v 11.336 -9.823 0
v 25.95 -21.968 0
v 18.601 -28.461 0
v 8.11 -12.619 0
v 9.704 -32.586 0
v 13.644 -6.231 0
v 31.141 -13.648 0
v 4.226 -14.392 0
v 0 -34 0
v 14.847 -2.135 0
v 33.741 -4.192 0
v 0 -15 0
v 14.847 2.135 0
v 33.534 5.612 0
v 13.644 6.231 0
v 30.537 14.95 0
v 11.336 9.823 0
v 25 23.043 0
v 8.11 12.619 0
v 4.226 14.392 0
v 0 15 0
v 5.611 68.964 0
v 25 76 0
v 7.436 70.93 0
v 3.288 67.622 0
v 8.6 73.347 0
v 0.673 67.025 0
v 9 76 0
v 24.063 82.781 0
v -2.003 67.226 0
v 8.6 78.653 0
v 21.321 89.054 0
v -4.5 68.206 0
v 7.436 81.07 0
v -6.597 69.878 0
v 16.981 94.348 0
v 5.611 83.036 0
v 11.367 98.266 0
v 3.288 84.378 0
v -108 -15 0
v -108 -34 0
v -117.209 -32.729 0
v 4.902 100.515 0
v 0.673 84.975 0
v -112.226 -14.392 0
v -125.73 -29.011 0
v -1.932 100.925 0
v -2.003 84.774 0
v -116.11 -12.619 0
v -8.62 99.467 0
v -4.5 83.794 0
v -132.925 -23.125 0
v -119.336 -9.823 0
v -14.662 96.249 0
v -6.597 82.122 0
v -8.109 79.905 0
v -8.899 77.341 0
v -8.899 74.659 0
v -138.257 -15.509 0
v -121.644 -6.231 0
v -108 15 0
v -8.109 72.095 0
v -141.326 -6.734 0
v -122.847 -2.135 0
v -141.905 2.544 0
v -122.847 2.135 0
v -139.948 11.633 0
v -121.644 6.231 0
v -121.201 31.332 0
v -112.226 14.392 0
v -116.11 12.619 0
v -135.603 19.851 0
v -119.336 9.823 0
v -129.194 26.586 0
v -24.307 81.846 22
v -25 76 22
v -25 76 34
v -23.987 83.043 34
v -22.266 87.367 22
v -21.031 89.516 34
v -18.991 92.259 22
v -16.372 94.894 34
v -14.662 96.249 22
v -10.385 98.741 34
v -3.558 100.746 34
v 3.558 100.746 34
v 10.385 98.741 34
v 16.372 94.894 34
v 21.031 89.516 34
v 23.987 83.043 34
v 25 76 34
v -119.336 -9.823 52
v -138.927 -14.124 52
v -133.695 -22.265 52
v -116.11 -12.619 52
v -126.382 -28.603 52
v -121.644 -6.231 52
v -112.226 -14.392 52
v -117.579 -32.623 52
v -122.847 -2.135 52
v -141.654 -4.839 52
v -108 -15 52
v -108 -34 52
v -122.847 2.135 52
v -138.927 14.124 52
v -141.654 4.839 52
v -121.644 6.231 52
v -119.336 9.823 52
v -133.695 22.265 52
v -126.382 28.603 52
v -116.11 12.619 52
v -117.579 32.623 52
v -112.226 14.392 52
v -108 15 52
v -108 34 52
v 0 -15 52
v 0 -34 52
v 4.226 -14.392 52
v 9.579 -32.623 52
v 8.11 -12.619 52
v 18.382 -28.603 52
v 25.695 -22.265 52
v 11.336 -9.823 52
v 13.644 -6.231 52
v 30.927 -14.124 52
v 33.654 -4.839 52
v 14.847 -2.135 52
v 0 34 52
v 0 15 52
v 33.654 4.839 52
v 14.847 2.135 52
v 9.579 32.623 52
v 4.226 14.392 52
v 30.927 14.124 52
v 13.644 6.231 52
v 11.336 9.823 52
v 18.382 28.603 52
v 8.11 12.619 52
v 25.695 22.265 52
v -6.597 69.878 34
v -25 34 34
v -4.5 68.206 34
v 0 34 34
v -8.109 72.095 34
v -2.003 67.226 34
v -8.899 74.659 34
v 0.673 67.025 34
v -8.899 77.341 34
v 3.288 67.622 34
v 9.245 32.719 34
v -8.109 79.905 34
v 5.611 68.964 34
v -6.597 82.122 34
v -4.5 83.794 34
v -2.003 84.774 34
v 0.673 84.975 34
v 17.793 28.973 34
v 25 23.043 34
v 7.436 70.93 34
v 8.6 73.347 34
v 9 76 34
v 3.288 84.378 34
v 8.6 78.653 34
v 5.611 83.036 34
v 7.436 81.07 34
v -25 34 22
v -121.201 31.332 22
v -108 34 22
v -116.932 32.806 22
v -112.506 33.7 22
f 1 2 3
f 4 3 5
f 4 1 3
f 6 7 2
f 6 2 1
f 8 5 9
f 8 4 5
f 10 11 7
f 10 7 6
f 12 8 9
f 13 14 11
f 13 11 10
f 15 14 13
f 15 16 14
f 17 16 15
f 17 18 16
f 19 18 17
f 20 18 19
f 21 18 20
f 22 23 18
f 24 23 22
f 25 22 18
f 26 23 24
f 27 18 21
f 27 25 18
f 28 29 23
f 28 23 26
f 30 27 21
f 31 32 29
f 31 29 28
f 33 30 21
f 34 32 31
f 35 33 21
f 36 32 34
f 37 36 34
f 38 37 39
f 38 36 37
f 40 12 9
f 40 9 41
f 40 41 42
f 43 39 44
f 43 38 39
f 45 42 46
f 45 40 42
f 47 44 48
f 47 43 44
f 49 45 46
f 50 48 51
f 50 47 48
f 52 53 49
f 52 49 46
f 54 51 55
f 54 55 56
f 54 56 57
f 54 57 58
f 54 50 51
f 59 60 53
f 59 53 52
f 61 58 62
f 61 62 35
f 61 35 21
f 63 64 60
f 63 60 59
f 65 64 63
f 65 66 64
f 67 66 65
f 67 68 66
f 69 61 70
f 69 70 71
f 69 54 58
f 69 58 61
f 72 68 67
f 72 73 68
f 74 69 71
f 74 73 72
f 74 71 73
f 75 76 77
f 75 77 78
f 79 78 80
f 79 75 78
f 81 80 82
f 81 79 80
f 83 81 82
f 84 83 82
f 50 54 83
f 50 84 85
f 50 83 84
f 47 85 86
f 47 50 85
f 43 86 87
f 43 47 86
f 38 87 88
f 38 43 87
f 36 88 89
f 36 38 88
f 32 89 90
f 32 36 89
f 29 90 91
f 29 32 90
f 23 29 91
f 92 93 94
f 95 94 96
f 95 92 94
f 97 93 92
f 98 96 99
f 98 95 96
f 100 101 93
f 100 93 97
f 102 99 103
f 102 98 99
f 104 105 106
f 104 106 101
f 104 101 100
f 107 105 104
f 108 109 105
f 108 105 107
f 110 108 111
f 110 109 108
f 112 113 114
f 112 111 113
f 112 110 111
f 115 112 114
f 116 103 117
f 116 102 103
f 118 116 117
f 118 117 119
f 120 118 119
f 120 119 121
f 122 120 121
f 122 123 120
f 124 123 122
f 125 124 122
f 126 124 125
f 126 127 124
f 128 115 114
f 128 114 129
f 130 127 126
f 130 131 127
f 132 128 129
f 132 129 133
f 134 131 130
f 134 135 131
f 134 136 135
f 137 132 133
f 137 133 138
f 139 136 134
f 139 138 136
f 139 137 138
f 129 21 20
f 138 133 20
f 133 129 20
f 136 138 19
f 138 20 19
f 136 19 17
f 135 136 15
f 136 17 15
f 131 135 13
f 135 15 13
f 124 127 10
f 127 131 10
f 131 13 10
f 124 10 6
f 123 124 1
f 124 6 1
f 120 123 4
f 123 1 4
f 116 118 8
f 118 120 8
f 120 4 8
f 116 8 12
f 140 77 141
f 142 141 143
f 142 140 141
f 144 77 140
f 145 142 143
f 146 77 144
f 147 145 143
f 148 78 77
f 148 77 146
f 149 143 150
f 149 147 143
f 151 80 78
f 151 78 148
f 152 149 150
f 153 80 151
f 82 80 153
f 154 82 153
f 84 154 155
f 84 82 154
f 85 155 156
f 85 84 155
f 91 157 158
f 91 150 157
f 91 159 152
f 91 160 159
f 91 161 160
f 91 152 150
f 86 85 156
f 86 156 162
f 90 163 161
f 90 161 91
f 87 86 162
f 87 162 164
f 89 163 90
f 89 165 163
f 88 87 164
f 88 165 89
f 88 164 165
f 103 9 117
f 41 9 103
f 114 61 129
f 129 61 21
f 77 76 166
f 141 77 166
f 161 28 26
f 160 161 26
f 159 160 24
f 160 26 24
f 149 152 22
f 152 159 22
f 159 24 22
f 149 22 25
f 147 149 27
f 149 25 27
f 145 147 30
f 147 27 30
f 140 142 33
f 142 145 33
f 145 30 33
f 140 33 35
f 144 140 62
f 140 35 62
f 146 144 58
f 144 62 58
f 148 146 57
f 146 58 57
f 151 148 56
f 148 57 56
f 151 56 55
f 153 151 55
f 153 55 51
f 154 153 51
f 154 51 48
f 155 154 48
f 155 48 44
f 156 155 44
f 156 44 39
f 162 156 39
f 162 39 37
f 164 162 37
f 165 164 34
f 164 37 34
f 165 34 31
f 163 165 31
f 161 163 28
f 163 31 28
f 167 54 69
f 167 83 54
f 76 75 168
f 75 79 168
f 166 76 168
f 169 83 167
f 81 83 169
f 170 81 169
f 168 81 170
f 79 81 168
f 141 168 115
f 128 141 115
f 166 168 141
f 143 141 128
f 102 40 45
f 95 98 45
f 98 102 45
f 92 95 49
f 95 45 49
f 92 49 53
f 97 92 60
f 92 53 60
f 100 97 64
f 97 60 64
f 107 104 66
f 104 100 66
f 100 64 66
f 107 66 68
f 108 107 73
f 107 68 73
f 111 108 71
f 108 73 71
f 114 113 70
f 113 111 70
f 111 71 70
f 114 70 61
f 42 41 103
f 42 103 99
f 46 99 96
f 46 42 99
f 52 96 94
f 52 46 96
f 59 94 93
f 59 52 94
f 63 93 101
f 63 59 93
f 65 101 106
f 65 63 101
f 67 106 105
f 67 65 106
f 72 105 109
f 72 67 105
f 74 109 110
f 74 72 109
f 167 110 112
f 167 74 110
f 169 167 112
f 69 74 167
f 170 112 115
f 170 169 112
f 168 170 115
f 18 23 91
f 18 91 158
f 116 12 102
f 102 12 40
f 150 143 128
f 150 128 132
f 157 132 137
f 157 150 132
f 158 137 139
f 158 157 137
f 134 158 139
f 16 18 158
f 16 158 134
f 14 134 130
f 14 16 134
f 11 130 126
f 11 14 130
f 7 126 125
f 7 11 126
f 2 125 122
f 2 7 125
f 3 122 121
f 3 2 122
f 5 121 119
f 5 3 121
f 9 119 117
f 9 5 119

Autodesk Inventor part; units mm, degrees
ref_plane "YZ Plane" through (0, 0, 0) normal (1, 0, 0) x (0, 1, 0)
ref_plane "XZ Plane" through (0, 0, 0) normal (0, 1, 0) x (-1, 0, 0)
sketch "Sketch1" plane through (0, 0, 0) normal (0, 0, 1) x (1, 0, 0)
  line L0 (0, 0) -> (-108, 0) construction
  line L1 (0, -15) -> (-108, -15)
  line L2 (-108, 15) -> (0, 15)
  arc A0 (0, -15) -> (0, 15) centre (0, 0) ccw
  arc A1 (-108, 15) -> (-108, -15) centre (-108, 0) ccw
  line L3 (0, 0) -> (-108, 0) construction
  line L4 (0, -34) -> (-108, -34)
  line L5 (-108, 34) -> (0, 34)
  arc A2 (0, -34) -> (0, 34) centre (0, 0) ccw
  arc A3 (-108, 34) -> (-108, -34) centre (-108, 0) ccw
  point P0 (-54, 0)
  point P1 (-54, 0)
  dimension "d0" = 108
  dimension "d1" = 15
  dimension "d2" = 34
extrude "Extrusion1" add sketch "Sketch1" along normal blind 52
sketch "Sketch2" plane through (0, 0, 0) normal (0, 0, 1) x (1, 0, 0)
  arc A0 (-108, 15) -> (-108, -15) centre (-108, 0) ccw projected
  line L0 (-108, -15) -> (0, -15) projected
  arc A1 (0, -15) -> (0, 15) centre (0, 0) ccw projected
  line L1 (0, 15) -> (-108, 15) projected
  arc A2 (-108, 34) -> (-108, -34) centre (-108, 0) ccw projected
  line L2 (-108, 34) -> (0, 34) projected
  arc A3 (0, -34) -> (0, 34) centre (0, 0) ccw projected
  line L3 (0, -34) -> (-108, -34) projected
  circle A4 centre (0, 76) radius 9
  arc A5 (25, 76) -> (-25, 76) centre (0, 76) ccw
  line L4 (25, 76) -> (25, 23.0434)
  line L5 (-25, 76) -> (-25, 34)
  arc A6 (0, -34) -> (0, 34) centre (0, 0) ccw projected
  line L6 (-25, 34) -> (0, 34)
  arc A7 (-108, 15) -> (-108, -15) centre (-108, 0) ccw projected
  line L7 (-108, -15) -> (0, -15) projected
  arc A8 (0, -15) -> (0, 15) centre (0, 0) ccw projected
  line L8 (0, 15) -> (-108, 15) projected
  arc A9 (-108, 34) -> (-108, -34) centre (-108, 0) ccw projected
  line L9 (-108, 34) -> (0, 34) projected
  arc A10 (0, -34) -> (0, 34) centre (0, 0) ccw projected
  line L10 (0, -34) -> (-108, -34) projected
  arc A11 (-108, 15) -> (-108, -15) centre (-108, 0) ccw projected
  line L11 (-108, -15) -> (0, -15) projected
  arc A12 (0, -15) -> (0, 15) centre (0, 0) ccw projected
  line L12 (0, 15) -> (-108, 15) projected
  arc A13 (-108, 34) -> (-108, -34) centre (-108, 0) ccw projected
  line L13 (-108, 34) -> (0, 34) projected
  arc A14 (0, -34) -> (0, 34) centre (0, 0) ccw projected
  line L14 (0, -34) -> (-108, -34) projected
  arc A15 (25, 23.0434) -> (0, 34) centre (0, 0) ccw
  dimension "d5" = 18
  dimension "d6" = 76
  dimension "d7" = 61
  dimension "d8" = 25
  dimension "d9" = 34
extrude "Extrusion2" add sketch "Sketch2" along normal blind 34 contours L5 A5 L4 A3 L2
ref_plane "Work Plane1" through (0, 0, 22) normal (0, 0, -1) x (-1, 0, 0)
sketch "Sketch3" plane through (0, 0, 22) normal (0, 0, -1) x (-1, 0, 0)
  circle A0 centre (0, 76) radius 9 projected
  arc A1 (108, -15) -> (108, 15) centre (108, 0) ccw projected
  line L0 (108, 15) -> (0, 15) projected
  arc A2 (0, 15) -> (0, -15) centre (0, 0) ccw projected
  line L1 (0, -15) -> (108, -15) projected
  arc A3 (108, -34) -> (108, 34) centre (108, 0) ccw projected
  line L2 (108, -34) -> (0, -34) projected
  arc A4 (-25, 23.0434) -> (0, -34) centre (0, 0) ccw projected
  line L3 (-25, 23.0434) -> (-25, 76) projected
  arc A5 (25, 76) -> (-25, 76) centre (0, 76) ccw projected
  line L4 (25, 76) -> (25, 34) projected
  line L5 (25, 34) -> (108, 34) projected
  arc A6 (25, 76) -> (-25, 76) centre (0, 76) ccw projected
  line L6 (14.6625, 96.2487) -> (121.2012, 31.3325)
  arc A7 (108, -34) -> (108, 34) centre (108, 0) ccw projected
extrude "Extrusion3" add sketch "Sketch3" along normal blind 22 contours A3 L5 L4 A5 L6
